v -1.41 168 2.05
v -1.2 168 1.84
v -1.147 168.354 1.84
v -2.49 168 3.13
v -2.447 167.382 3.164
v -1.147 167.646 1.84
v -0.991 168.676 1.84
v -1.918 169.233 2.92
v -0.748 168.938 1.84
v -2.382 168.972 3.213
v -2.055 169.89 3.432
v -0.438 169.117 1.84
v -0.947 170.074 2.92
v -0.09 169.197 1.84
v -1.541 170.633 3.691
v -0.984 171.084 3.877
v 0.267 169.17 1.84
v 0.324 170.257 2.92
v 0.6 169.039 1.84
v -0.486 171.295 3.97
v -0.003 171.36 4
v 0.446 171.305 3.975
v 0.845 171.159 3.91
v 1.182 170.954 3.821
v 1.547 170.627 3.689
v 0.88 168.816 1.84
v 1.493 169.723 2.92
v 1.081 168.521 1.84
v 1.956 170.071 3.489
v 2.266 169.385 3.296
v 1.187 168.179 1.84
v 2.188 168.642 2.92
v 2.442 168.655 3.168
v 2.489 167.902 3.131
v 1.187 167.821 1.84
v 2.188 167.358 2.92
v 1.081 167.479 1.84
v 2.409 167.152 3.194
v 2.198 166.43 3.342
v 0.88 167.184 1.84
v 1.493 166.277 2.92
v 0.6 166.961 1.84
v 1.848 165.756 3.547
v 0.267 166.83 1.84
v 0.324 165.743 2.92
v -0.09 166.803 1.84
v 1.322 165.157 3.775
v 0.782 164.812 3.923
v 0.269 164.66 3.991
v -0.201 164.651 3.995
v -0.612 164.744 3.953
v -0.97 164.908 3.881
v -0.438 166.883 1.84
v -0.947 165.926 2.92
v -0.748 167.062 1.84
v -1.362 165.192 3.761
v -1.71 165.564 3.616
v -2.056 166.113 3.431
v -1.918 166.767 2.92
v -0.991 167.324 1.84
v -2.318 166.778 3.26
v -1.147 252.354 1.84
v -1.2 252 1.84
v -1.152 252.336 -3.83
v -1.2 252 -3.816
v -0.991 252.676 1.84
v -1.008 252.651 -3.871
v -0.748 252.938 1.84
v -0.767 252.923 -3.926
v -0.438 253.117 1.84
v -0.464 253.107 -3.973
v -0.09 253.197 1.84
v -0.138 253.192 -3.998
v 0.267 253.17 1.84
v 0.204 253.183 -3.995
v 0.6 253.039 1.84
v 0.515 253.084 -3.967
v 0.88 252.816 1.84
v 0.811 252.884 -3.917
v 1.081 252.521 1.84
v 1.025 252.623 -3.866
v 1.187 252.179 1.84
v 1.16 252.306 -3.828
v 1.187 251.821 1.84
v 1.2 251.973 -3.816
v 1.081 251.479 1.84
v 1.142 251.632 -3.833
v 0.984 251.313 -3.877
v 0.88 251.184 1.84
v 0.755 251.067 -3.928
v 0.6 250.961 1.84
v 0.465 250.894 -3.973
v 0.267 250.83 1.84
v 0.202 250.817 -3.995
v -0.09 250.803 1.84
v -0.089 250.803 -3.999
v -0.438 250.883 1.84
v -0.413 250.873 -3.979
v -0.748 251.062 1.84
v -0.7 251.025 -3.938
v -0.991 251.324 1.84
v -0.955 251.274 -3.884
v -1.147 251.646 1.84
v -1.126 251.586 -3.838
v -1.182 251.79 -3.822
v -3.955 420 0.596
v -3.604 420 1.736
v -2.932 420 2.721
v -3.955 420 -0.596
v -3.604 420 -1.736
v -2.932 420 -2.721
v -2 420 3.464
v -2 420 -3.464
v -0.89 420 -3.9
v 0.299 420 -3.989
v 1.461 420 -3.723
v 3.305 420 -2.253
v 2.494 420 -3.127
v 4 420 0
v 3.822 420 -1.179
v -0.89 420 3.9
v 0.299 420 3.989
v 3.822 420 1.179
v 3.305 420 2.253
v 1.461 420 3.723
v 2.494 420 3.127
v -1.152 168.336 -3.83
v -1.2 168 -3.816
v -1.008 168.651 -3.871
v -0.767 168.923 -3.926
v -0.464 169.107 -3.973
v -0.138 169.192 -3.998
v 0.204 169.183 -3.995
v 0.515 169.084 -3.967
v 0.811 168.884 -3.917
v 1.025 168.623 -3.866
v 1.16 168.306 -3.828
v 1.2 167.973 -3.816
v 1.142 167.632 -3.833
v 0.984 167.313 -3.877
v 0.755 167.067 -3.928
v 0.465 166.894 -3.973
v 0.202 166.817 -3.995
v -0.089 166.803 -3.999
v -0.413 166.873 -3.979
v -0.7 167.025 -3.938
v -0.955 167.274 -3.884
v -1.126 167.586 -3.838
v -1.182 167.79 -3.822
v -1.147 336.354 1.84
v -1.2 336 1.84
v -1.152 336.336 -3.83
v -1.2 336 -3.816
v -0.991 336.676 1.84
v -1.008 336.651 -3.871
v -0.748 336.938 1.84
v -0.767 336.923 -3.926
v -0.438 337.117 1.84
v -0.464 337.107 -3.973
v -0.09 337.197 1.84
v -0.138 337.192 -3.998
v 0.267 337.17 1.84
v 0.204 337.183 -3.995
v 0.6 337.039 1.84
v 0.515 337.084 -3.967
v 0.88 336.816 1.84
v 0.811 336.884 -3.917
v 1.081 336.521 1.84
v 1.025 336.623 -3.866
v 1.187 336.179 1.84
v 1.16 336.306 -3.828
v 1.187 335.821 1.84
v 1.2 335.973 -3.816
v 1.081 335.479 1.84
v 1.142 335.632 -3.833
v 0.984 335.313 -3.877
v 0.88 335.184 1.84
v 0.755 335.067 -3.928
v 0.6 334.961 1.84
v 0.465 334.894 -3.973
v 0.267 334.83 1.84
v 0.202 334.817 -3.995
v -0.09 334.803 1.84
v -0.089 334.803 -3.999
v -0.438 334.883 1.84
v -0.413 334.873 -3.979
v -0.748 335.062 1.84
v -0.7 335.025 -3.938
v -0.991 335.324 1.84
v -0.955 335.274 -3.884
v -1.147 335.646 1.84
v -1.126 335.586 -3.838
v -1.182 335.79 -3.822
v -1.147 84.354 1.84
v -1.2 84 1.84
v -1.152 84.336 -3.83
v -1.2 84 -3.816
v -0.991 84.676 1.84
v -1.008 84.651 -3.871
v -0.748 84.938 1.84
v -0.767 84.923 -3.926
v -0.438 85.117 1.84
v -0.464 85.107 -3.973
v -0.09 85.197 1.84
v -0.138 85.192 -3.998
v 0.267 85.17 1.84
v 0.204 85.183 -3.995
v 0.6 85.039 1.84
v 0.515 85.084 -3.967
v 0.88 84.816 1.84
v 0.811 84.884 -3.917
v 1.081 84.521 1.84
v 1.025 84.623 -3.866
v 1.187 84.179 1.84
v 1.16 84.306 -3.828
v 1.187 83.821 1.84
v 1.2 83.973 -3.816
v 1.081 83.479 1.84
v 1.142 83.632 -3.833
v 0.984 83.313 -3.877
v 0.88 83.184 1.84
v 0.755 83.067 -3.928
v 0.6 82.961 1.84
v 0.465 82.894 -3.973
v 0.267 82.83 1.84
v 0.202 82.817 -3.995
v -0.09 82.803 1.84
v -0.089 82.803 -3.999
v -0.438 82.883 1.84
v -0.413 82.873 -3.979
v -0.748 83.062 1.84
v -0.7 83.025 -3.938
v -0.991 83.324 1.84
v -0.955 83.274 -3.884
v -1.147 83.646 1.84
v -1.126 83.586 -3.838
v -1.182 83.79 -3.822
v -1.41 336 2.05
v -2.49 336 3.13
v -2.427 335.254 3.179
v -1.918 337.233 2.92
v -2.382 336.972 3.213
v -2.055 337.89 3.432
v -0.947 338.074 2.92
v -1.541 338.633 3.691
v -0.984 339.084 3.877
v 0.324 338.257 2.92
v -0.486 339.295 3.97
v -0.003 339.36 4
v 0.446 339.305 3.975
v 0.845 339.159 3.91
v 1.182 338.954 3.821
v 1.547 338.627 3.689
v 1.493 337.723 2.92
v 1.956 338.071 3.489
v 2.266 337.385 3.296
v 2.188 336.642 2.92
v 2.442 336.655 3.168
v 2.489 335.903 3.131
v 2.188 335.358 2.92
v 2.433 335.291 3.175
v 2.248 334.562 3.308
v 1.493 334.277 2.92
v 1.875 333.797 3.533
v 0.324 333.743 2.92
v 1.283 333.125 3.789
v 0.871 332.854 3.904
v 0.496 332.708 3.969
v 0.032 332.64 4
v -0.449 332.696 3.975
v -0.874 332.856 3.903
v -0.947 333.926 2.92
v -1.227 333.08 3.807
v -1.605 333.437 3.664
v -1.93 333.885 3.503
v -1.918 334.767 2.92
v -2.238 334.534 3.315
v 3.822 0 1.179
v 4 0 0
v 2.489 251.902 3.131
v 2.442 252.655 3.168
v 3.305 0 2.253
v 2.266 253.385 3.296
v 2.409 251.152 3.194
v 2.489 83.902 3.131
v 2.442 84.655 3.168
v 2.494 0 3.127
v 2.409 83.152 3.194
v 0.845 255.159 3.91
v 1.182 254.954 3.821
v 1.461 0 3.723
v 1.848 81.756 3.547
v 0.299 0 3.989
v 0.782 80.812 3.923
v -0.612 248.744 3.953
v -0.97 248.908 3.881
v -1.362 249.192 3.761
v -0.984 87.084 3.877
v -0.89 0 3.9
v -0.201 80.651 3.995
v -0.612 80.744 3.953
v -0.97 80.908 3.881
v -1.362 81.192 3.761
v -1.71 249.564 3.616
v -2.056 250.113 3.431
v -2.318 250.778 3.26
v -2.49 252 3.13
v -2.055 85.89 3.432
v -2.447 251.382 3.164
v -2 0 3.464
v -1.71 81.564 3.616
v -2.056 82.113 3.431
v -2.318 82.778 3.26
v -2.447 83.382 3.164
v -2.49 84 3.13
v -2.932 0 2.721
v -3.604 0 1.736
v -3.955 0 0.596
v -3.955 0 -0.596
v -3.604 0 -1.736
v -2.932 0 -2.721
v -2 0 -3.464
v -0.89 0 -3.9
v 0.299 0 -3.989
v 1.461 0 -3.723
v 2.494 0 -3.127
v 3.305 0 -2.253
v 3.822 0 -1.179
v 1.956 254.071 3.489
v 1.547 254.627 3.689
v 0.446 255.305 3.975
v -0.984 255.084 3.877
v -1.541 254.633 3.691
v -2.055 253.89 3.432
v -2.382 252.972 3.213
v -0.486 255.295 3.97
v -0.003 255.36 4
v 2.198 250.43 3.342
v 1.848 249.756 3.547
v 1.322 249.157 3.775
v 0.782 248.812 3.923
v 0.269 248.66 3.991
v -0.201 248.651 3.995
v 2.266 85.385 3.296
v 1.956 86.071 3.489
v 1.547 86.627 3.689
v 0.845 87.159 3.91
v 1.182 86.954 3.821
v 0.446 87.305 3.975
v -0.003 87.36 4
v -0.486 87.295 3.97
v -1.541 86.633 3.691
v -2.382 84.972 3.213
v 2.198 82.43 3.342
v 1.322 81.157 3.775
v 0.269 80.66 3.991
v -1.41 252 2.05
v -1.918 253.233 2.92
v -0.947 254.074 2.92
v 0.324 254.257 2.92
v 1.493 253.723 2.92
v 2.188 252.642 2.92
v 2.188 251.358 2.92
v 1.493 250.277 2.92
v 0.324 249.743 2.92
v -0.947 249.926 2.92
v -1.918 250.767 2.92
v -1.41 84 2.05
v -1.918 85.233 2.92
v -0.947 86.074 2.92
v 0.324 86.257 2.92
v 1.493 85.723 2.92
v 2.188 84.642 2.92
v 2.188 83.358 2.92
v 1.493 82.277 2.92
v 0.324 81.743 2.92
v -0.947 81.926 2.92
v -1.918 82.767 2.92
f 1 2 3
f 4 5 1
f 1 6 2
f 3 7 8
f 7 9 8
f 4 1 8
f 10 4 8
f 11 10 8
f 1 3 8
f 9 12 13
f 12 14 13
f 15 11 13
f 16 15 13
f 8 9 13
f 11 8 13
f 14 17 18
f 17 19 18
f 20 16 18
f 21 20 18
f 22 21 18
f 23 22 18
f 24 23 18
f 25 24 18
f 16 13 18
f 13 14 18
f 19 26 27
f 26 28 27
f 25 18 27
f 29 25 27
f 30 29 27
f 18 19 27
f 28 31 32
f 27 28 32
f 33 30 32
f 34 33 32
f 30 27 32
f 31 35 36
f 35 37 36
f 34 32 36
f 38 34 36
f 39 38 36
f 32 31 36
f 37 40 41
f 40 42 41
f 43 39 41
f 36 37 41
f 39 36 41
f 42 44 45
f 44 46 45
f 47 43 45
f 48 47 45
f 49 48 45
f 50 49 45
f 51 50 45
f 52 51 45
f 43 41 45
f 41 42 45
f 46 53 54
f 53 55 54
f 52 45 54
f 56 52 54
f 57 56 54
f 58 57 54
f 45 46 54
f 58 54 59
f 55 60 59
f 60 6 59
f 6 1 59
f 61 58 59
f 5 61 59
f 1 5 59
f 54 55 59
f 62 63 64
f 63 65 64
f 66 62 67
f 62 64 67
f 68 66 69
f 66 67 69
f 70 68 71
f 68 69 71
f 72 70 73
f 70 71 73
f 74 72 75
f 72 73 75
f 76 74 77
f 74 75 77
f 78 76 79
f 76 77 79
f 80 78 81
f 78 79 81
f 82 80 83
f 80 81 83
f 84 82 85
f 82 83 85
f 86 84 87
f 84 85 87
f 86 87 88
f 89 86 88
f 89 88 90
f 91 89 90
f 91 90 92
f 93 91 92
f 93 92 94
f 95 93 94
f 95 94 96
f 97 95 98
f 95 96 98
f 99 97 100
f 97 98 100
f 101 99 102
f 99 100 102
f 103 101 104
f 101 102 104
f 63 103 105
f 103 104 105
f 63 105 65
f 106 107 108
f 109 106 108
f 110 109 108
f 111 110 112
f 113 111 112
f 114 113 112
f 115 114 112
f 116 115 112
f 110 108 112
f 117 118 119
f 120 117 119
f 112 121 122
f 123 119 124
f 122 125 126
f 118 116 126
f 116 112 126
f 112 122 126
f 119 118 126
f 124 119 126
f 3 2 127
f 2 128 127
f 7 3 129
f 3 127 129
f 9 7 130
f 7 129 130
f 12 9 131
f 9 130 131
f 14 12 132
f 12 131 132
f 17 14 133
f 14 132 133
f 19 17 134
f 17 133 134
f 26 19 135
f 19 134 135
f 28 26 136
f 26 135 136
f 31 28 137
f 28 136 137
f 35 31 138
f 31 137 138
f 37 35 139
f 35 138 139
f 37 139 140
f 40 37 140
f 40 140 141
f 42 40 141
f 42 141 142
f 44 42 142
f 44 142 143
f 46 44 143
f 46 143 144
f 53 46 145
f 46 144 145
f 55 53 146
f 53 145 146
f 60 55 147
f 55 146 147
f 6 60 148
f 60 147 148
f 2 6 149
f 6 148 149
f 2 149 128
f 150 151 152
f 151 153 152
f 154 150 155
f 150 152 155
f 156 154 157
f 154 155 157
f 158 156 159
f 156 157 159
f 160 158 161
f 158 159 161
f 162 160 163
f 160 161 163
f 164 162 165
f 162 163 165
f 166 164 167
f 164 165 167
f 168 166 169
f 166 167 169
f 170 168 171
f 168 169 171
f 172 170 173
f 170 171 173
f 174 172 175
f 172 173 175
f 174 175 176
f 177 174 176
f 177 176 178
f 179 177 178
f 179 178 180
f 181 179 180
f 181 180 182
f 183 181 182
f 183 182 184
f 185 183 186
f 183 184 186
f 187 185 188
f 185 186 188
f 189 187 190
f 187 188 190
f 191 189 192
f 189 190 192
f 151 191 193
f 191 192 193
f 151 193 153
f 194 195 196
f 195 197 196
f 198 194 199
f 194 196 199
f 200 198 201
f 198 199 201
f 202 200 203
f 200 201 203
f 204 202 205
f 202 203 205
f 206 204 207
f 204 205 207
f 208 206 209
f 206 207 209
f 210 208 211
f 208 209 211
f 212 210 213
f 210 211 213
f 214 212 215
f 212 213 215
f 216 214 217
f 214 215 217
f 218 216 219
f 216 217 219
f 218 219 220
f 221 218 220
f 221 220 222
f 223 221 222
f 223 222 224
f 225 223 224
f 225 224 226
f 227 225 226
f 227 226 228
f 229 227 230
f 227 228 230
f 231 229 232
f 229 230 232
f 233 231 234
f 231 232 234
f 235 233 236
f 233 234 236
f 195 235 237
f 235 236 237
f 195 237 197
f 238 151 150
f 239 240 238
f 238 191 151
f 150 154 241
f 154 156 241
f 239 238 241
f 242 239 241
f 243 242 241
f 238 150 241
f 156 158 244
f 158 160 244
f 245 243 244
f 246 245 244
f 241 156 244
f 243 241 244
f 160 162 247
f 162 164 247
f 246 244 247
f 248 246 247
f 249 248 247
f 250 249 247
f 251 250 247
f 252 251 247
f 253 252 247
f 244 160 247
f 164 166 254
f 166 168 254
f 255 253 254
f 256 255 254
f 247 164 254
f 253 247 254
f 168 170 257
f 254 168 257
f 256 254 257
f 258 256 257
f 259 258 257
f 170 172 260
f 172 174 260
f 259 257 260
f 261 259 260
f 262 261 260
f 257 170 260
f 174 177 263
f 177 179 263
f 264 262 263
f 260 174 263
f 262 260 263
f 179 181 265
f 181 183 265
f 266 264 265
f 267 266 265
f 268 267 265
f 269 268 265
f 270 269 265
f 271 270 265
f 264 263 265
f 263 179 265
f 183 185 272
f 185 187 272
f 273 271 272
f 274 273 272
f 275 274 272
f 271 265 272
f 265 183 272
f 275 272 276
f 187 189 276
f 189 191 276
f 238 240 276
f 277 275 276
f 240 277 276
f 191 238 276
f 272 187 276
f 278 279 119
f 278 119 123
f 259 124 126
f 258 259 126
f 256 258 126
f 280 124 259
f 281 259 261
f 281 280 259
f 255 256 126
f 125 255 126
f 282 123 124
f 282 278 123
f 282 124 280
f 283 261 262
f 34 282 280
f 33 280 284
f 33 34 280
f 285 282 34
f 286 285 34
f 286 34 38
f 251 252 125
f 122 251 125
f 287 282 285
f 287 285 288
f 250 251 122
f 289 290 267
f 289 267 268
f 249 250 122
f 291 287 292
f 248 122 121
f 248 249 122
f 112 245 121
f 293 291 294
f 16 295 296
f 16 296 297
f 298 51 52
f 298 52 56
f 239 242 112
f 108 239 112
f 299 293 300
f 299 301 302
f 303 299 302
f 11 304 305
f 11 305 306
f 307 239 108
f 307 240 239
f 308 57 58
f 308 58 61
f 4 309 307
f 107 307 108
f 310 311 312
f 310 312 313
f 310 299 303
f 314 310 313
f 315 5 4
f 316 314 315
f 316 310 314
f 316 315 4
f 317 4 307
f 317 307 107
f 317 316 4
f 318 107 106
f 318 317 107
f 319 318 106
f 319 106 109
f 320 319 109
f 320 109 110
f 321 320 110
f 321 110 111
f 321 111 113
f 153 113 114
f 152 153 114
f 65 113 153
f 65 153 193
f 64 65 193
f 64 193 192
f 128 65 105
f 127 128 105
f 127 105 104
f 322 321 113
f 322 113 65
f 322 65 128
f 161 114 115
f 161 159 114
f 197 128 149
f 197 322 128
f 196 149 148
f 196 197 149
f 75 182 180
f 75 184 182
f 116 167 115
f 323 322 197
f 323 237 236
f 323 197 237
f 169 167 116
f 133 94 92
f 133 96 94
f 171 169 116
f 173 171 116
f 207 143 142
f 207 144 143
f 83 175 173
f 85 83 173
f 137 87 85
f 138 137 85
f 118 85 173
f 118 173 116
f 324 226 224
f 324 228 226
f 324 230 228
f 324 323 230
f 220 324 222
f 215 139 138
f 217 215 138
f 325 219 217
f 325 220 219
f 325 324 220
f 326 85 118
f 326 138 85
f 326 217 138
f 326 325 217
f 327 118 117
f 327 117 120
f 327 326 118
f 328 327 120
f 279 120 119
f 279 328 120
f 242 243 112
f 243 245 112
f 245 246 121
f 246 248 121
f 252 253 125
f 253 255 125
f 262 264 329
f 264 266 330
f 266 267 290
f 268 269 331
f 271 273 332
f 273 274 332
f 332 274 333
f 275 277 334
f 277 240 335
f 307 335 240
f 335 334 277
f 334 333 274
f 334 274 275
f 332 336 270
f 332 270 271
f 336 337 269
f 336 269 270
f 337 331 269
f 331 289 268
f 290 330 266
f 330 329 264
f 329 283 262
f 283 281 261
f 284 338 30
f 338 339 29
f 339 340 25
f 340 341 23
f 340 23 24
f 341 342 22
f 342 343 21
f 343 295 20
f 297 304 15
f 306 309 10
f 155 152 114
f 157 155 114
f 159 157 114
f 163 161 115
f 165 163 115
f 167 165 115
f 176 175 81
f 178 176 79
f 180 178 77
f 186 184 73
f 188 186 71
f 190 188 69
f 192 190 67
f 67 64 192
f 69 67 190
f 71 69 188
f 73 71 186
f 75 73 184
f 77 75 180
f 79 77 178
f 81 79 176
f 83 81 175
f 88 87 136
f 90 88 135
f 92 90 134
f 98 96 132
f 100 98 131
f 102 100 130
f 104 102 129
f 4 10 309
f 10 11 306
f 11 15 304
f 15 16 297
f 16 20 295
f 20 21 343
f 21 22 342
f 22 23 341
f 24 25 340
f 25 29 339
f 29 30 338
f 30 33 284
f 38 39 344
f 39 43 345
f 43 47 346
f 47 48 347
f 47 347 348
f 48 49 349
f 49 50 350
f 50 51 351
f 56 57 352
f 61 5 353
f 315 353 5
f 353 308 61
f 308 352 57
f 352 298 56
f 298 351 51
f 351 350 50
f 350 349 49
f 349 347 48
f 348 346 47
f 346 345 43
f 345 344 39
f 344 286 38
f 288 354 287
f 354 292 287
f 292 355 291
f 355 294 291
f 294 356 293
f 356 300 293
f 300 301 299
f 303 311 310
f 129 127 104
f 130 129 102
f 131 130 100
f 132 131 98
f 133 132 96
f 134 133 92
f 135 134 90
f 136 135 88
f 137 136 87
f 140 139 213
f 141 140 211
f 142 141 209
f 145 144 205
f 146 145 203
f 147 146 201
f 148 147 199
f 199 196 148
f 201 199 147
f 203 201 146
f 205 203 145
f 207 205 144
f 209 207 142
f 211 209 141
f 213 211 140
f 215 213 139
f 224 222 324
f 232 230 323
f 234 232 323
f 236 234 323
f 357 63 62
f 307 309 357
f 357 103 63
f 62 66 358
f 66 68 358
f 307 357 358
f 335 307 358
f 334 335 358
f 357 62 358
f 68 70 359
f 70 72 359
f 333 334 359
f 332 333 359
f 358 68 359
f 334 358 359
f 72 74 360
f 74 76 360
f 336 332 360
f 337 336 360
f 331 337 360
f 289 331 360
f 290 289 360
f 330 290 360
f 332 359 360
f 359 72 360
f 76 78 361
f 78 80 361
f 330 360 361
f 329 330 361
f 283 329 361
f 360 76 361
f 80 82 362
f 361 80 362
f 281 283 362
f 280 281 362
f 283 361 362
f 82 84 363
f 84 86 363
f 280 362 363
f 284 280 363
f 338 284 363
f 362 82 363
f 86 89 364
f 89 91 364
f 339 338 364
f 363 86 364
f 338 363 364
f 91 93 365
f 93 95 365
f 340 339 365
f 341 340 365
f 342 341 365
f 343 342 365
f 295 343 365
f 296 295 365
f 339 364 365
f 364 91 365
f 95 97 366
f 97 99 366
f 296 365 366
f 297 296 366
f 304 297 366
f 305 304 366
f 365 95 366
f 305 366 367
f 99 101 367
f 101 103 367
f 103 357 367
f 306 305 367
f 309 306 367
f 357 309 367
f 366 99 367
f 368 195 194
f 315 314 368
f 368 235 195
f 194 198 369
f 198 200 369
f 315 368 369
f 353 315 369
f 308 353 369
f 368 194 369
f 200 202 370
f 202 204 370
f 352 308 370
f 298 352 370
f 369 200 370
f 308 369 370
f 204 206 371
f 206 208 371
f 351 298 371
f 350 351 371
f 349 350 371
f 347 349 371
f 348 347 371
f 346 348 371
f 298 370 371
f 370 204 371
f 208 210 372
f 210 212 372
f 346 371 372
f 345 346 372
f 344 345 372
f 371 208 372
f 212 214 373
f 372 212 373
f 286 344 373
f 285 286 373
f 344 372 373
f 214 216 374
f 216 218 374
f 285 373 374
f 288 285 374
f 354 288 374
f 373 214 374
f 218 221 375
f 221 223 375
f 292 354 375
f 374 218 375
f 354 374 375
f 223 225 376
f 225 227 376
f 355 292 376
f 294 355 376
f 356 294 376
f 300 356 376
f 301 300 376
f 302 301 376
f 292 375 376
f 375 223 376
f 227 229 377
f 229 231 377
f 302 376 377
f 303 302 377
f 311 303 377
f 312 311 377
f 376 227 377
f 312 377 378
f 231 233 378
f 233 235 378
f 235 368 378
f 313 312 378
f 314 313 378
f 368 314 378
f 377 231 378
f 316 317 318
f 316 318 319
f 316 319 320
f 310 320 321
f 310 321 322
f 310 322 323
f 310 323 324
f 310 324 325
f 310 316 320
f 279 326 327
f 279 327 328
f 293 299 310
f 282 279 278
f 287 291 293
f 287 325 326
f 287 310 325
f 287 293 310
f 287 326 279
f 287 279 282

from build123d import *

# Parameters (mm, degrees)
F0_R           = 4
F1_DEPTH       = 420
F4_D           = 2.4
F4_DEPTH       = 100
F4_CSINK_D     = 6.72
F4_CSINK_ANGLE = 90
F4_TIP         = 0.7210327428


with BuildPart() as f1:
    # F0 (on Front) → F1 (new body)
    with BuildSketch(Plane.XZ):
        Circle(F0_R)
    extrude(amount=-F1_DEPTH)

    # F4
    with Locations(Plane.XY.offset(4)):
        with Locations((0, 84), (0, 168), (0, 252), (0, 336)):
            CounterSinkHole(F4_D / 2, F4_CSINK_D / 2, depth=F4_DEPTH, counter_sink_angle=F4_CSINK_ANGLE)
            with Locations((0, 0, -(F4_DEPTH + F4_TIP / 2))):  # 118° drill point
                Cone(0, F4_D / 2, F4_TIP, mode=Mode.SUBTRACT)


solid = f1.part
